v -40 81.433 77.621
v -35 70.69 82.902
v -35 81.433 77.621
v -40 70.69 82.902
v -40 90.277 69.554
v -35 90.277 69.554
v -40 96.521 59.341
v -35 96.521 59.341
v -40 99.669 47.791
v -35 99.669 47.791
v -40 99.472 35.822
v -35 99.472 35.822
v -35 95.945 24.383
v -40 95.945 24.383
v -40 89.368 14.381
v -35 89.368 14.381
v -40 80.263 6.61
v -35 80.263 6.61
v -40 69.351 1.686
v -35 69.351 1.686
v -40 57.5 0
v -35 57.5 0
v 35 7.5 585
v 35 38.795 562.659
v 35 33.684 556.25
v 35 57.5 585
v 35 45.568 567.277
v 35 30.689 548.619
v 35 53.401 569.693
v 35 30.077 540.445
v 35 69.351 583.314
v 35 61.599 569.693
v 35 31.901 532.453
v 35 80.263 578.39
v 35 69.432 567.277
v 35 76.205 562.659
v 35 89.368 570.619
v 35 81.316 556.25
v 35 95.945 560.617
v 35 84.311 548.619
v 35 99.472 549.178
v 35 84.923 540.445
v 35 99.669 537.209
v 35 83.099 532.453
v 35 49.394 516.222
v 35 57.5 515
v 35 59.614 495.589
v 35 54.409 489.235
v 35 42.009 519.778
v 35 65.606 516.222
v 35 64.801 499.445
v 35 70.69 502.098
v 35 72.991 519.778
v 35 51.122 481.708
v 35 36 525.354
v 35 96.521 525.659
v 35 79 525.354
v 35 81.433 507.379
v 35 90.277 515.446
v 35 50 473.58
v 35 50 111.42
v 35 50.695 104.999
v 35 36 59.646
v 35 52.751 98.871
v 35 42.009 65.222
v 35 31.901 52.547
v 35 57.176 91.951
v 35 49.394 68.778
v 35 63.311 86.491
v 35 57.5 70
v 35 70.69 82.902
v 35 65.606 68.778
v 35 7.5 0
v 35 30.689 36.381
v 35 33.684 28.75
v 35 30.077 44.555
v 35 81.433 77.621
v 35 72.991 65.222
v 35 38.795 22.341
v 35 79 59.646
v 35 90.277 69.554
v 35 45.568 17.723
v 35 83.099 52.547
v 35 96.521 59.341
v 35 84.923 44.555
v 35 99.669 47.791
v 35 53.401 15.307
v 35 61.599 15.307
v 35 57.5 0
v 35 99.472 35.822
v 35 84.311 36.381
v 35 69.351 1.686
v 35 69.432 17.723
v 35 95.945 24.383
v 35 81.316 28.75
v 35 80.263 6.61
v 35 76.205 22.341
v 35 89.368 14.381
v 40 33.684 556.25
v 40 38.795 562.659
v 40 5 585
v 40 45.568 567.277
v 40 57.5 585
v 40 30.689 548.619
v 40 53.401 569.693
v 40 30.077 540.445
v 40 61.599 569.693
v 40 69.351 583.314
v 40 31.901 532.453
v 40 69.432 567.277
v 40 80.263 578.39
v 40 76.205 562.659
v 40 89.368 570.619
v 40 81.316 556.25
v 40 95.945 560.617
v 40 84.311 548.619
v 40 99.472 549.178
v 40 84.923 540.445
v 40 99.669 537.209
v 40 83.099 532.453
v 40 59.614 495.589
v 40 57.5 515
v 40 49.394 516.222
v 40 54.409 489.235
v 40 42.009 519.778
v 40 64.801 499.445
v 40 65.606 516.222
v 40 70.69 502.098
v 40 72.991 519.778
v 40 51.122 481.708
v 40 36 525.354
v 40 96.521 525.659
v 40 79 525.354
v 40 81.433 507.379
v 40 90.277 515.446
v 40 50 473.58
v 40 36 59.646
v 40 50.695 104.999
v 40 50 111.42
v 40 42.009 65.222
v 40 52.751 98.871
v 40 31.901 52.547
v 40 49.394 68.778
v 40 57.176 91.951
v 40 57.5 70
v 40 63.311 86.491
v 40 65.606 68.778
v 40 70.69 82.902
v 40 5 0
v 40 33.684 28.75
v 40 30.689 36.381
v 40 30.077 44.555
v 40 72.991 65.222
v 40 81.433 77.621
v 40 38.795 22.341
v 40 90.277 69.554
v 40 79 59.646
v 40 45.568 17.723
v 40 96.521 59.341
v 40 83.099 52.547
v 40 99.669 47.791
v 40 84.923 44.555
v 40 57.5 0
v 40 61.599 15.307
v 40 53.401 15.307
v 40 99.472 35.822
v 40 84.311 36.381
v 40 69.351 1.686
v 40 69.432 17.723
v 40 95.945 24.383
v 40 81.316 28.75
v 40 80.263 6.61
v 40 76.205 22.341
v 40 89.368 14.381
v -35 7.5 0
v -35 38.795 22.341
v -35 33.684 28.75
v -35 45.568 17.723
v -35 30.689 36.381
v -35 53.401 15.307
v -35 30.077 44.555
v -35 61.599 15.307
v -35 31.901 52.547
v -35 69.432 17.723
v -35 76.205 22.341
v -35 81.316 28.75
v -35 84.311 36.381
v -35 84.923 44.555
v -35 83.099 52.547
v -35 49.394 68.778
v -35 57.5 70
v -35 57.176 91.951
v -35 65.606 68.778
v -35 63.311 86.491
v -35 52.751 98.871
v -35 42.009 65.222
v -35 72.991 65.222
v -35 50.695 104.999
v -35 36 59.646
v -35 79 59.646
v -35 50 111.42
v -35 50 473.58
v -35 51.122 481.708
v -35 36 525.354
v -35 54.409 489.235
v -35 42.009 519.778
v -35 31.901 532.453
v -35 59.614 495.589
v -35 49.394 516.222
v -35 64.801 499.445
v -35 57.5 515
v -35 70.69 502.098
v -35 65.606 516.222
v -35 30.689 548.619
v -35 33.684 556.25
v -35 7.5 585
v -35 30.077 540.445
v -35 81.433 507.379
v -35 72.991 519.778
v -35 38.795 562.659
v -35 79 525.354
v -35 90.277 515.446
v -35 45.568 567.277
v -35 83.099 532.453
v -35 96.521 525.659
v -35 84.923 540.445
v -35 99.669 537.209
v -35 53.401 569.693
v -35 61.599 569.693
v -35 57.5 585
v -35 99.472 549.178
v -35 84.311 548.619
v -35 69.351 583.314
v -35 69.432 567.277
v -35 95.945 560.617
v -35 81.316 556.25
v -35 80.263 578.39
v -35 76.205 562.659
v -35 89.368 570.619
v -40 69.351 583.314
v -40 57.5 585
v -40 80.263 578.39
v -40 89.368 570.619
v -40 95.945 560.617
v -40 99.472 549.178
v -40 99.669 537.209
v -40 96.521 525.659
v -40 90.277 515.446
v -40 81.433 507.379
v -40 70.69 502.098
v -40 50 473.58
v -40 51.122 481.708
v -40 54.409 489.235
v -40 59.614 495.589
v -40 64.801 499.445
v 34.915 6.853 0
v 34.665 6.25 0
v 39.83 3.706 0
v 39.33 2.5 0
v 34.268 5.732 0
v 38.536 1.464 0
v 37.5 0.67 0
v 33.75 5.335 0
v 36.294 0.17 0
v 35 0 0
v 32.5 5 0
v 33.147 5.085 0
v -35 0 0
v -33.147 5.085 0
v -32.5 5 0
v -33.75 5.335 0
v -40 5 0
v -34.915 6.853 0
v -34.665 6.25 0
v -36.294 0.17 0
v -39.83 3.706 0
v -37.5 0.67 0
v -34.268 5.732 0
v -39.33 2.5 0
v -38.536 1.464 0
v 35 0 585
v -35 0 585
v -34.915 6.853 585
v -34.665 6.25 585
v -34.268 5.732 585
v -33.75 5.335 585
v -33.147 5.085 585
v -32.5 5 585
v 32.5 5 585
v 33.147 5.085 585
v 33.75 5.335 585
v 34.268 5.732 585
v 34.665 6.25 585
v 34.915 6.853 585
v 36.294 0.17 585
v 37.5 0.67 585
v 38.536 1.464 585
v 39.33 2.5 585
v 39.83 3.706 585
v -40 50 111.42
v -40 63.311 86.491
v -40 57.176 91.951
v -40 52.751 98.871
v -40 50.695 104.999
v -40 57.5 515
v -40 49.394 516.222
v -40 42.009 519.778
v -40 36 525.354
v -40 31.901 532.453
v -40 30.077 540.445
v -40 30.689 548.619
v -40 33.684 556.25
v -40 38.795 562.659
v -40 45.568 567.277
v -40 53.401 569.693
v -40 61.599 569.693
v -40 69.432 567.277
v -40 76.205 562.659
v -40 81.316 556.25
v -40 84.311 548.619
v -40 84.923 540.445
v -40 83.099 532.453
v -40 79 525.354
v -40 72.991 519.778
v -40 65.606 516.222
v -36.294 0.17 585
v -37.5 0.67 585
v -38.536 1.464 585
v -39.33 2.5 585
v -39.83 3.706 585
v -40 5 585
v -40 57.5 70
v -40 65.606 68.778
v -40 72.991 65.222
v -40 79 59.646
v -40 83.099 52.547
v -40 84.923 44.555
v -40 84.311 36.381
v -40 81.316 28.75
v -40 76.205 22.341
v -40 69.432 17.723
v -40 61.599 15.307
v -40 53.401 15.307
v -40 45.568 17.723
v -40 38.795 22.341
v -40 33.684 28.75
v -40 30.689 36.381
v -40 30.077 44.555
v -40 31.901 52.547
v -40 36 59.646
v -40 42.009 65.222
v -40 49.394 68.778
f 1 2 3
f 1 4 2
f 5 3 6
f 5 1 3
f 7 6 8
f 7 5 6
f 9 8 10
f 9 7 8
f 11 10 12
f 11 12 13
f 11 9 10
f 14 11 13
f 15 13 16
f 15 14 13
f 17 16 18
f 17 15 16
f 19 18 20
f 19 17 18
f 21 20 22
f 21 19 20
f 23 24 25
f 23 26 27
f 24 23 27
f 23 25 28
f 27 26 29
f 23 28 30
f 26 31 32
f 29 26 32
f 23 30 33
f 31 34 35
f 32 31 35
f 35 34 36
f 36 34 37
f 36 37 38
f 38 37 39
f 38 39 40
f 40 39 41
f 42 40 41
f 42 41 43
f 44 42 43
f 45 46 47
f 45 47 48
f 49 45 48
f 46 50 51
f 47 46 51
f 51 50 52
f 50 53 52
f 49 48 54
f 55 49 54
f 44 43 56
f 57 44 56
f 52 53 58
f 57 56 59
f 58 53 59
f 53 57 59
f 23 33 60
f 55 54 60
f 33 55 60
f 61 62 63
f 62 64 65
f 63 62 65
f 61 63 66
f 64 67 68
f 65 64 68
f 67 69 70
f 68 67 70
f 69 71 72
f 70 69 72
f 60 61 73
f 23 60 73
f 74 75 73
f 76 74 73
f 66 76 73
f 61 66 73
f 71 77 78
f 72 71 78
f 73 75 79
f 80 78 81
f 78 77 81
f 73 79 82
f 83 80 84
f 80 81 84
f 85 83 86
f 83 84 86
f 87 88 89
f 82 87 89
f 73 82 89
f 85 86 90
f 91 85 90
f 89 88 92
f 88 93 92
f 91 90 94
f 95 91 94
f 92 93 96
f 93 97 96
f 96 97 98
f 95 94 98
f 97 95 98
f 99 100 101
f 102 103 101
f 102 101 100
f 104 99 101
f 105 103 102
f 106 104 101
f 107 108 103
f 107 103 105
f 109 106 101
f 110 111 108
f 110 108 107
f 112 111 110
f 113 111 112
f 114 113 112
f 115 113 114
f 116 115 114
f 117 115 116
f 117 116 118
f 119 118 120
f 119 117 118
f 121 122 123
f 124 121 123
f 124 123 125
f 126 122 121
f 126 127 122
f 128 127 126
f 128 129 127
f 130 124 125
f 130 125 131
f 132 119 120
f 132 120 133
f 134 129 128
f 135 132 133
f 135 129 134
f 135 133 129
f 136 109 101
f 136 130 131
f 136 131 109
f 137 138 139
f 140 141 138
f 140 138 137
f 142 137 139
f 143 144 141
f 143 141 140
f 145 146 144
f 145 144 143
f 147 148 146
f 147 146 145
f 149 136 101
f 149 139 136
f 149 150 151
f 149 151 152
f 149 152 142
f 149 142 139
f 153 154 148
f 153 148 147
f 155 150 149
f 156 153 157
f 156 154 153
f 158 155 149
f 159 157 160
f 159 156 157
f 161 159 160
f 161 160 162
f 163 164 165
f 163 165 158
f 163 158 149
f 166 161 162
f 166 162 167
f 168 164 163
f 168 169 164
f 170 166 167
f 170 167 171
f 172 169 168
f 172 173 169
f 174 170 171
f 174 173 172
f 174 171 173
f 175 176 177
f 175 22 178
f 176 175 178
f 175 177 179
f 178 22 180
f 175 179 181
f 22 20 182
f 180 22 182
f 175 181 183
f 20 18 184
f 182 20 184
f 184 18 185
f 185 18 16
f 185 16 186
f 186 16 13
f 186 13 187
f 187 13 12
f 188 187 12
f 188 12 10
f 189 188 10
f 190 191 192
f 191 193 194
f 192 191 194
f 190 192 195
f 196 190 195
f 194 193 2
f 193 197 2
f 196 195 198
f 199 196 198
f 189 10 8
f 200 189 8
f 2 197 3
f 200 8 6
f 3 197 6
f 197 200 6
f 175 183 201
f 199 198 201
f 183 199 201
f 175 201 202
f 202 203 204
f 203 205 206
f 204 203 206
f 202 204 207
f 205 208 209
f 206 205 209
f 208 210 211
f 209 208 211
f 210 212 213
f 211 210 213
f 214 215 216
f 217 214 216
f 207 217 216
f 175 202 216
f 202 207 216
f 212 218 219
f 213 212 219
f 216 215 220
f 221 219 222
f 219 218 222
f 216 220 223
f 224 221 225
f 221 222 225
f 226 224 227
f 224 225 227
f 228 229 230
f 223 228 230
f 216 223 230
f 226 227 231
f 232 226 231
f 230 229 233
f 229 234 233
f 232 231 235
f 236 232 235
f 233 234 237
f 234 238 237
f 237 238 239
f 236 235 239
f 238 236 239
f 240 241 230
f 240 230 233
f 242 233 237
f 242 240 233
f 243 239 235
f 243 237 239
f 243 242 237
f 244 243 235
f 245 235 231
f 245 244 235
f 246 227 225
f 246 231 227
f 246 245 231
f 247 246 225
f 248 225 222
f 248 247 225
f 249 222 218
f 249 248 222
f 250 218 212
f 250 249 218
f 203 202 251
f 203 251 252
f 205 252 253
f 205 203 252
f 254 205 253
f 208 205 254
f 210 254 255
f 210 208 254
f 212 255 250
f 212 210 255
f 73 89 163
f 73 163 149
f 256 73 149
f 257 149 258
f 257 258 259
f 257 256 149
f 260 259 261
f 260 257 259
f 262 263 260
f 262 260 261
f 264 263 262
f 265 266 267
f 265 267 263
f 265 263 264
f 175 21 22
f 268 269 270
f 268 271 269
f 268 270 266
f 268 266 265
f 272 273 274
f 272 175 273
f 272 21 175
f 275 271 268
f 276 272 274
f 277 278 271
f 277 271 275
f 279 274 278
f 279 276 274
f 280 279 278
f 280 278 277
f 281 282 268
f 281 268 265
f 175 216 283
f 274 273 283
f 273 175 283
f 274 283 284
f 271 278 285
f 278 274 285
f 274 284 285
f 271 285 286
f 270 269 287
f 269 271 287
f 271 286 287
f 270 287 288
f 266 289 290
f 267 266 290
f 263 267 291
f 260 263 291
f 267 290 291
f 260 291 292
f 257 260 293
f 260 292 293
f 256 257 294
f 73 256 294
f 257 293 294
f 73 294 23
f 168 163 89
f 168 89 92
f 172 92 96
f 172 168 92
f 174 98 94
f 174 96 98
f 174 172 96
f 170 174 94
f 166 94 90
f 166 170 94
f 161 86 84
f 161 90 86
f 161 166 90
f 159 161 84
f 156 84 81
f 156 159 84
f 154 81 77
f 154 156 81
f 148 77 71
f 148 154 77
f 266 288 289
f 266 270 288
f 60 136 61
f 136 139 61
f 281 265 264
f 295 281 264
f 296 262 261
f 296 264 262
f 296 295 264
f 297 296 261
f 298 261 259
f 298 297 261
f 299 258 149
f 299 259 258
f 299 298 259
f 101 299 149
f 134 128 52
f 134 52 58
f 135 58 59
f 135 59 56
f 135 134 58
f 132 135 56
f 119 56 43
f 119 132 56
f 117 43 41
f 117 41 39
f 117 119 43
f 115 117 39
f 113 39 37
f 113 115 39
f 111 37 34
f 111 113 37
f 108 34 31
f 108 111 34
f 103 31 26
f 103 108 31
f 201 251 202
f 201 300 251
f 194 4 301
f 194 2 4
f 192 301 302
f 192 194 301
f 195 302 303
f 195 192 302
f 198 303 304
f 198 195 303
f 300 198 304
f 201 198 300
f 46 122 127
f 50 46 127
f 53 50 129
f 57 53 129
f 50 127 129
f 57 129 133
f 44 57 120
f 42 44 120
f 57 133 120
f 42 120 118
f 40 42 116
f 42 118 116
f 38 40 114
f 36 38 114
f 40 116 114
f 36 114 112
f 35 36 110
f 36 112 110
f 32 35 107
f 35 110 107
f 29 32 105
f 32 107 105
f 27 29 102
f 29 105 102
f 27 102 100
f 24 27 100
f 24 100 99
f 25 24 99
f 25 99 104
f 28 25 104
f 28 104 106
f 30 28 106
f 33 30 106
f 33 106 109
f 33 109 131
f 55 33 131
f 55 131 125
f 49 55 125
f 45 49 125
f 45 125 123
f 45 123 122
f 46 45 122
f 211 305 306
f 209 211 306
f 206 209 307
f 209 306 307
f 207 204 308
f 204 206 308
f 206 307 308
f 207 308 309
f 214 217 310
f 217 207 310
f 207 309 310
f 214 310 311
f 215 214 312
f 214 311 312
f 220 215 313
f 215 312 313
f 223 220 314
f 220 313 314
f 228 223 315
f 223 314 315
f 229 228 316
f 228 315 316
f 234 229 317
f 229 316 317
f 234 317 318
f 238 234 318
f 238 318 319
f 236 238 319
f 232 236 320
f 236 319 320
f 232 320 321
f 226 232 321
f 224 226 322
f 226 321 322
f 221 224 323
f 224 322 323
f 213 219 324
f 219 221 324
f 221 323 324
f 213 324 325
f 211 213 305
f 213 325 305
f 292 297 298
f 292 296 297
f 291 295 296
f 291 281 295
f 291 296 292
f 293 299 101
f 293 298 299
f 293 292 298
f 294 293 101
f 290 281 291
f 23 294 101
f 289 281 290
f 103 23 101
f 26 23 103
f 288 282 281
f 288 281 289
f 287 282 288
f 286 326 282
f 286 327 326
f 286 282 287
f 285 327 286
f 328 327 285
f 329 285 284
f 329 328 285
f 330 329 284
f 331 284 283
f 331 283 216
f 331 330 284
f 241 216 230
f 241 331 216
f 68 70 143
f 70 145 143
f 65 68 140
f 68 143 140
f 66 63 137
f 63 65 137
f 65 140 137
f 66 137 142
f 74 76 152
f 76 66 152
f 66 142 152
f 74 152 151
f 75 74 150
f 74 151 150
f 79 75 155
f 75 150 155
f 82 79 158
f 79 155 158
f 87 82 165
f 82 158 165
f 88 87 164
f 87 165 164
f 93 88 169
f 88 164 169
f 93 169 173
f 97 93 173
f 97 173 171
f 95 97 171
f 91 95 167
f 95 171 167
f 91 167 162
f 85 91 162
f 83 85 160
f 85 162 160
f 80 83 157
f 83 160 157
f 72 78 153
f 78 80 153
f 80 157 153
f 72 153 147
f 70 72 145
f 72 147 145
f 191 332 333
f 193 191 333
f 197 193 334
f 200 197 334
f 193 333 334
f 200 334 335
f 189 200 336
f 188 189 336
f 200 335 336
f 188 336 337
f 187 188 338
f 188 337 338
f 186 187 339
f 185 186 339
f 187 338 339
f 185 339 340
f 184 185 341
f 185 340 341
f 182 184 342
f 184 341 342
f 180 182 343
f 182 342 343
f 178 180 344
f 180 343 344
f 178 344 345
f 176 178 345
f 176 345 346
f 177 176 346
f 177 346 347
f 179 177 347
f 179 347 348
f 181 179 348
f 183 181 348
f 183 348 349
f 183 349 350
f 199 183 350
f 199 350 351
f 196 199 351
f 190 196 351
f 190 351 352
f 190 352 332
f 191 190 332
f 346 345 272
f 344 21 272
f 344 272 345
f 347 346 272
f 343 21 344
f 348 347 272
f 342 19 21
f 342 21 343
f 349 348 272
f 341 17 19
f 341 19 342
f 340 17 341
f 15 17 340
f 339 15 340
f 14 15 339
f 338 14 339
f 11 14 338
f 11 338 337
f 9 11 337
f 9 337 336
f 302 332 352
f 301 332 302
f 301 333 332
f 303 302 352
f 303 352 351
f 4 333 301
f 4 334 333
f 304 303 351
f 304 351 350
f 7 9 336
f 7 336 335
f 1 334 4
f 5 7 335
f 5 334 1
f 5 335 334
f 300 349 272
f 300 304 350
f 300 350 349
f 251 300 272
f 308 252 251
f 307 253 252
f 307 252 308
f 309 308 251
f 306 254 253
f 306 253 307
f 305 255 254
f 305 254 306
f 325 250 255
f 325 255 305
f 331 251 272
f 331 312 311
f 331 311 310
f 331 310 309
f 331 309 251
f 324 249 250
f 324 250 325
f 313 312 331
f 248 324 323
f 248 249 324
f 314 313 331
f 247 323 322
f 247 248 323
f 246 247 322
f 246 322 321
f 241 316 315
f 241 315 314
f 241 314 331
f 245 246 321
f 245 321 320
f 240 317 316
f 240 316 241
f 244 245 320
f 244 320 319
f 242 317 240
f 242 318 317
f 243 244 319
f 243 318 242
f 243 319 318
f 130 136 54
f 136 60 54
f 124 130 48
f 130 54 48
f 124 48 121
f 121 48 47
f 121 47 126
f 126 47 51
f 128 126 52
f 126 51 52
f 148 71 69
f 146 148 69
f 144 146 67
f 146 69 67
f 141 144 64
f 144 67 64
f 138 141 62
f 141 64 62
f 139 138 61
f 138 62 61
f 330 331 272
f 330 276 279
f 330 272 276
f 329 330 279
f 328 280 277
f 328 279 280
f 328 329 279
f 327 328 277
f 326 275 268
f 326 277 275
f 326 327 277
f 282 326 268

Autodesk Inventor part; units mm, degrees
ref_plane "XZ Plane" through (0, 0, 0) normal (0, 1, 0) x (-1, 0, 0)
sketch "Skizze1" plane through (0, 0, 0) normal (0, 0, 1) x (1, 0, 0)
  line L0 (0, 60) -> (0, -10) projected
  line L1 (-56, 0) -> (56, 0) projected
  line L2 (-56, 0) -> (56, 0) projected
  line L3 (0, -10) -> (0, 60) projected
  line L4 (-40, 0) -> (40, 0)
  line L5 (-40, 0) -> (-40, 50)
  line L6 (40, 0) -> (40, 50)
  line L7 (-35, 50) -> (-35, 5)
  line L8 (-35, 5) -> (35, 5)
  line L9 (35, 5) -> (35, 50)
  line L10 (-40, 50) -> (-35, 50)
  line L11 (40, 50) -> (35, 50)
  point P0 (0, 0)
  point P1 (0, 0)
  dimension "d0" = 80
  dimension "d1" = 50
  dimension "d2" = 50
  dimension "d4" = 5
extrude "Extrusion1" add sketch "Skizze1" along normal blind 585
fillet "Rundung1" radius 2.5 2 edges at (-35, 5, 292.5) (35, 5, 292.5)
fillet "Rundung1" radius 5 2 edges at (40, 0, 292.5) (-40, 0, 292.5)
sketch "Skizze2" plane through (40, 50, 585) normal (1, 0, 0) x (0, 0, -1)
  line L0 (585, -45) -> (0, -45) projected
  line L1 (585, -45) -> (585, 0) projected
  line L2 (585, 0) -> (0, 0) projected
  line L3 (0, -45) -> (0, 0) projected
  line L4 (0, -45) -> (0, -50) projected
  line L5 (0, -50) -> (585, -50) projected
  line L6 (585, -50) -> (585, -45) projected
  line L7 (585, -45) -> (0, -45) projected
  arc A0 (85, 7.5) -> (0, 7.5) centre (42.5, 7.5) ccw
  line L8 (0, 7.5) -> (0, 0)
  line L9 (85, 7.5) -> (85, 0)
  point P0 (585, -50)
  dimension "d9" = 85
  dimension "d10" = 100
  dimension "d11" = 42.5
extrude "Extrusion2" add sketch "Skizze2" against normal blind 5 contours L8 A0 L9 L2
sketch "Skizze3" plane through (40, 5, 0) normal (1, 0, 0) x (0, 0, -1)
  line L0 (0, 0) -> (-585, 0) projected
  line L1 (0, 0) -> (0, 45) projected
  line L2 (0, 45) -> (-500, 45) projected
  line L3 (-500, 45) -> (-500, 52.5) projected
  arc A0 (-500, 52.5) -> (-585, 52.5) centre (-542.5, 52.5) ccw projected
  line L4 (-585, 0) -> (-585, 52.5) projected
  circle A1 centre (-542.5, 52.5) radius 27.5
  point P0 (0, -5)
  dimension "d14" = 55
extrude "Extrusion3" cut sketch "Skizze3" against normal blind 5 contours A1
ref_plane "Arbeitsebene1" through (40, 5, 292.5) normal (0, 0, 1) x (1, 0, 0)
ref_plane "Arbeitsebene2" through (0, 0, 0) normal (1, 0, 0) x (0, 1, 0)
mirror "Spiegeln1" about plane through (40, 5, 292.5) normal (0, 0, 1) of "Extrusion2", "Extrusion3"
mirror "Spiegeln2" about plane through (0, 0, 0) normal (1, 0, 0) of "Extrusion2", "Extrusion3", "Spiegeln1"
fillet "Rundung2" radius 30 4 edges at (37.5, 50, 500) (-37.5, 50, 500) (-37.5, 50, 85) (37.5, 50, 85)
properties part number "Randschiene 2L"
